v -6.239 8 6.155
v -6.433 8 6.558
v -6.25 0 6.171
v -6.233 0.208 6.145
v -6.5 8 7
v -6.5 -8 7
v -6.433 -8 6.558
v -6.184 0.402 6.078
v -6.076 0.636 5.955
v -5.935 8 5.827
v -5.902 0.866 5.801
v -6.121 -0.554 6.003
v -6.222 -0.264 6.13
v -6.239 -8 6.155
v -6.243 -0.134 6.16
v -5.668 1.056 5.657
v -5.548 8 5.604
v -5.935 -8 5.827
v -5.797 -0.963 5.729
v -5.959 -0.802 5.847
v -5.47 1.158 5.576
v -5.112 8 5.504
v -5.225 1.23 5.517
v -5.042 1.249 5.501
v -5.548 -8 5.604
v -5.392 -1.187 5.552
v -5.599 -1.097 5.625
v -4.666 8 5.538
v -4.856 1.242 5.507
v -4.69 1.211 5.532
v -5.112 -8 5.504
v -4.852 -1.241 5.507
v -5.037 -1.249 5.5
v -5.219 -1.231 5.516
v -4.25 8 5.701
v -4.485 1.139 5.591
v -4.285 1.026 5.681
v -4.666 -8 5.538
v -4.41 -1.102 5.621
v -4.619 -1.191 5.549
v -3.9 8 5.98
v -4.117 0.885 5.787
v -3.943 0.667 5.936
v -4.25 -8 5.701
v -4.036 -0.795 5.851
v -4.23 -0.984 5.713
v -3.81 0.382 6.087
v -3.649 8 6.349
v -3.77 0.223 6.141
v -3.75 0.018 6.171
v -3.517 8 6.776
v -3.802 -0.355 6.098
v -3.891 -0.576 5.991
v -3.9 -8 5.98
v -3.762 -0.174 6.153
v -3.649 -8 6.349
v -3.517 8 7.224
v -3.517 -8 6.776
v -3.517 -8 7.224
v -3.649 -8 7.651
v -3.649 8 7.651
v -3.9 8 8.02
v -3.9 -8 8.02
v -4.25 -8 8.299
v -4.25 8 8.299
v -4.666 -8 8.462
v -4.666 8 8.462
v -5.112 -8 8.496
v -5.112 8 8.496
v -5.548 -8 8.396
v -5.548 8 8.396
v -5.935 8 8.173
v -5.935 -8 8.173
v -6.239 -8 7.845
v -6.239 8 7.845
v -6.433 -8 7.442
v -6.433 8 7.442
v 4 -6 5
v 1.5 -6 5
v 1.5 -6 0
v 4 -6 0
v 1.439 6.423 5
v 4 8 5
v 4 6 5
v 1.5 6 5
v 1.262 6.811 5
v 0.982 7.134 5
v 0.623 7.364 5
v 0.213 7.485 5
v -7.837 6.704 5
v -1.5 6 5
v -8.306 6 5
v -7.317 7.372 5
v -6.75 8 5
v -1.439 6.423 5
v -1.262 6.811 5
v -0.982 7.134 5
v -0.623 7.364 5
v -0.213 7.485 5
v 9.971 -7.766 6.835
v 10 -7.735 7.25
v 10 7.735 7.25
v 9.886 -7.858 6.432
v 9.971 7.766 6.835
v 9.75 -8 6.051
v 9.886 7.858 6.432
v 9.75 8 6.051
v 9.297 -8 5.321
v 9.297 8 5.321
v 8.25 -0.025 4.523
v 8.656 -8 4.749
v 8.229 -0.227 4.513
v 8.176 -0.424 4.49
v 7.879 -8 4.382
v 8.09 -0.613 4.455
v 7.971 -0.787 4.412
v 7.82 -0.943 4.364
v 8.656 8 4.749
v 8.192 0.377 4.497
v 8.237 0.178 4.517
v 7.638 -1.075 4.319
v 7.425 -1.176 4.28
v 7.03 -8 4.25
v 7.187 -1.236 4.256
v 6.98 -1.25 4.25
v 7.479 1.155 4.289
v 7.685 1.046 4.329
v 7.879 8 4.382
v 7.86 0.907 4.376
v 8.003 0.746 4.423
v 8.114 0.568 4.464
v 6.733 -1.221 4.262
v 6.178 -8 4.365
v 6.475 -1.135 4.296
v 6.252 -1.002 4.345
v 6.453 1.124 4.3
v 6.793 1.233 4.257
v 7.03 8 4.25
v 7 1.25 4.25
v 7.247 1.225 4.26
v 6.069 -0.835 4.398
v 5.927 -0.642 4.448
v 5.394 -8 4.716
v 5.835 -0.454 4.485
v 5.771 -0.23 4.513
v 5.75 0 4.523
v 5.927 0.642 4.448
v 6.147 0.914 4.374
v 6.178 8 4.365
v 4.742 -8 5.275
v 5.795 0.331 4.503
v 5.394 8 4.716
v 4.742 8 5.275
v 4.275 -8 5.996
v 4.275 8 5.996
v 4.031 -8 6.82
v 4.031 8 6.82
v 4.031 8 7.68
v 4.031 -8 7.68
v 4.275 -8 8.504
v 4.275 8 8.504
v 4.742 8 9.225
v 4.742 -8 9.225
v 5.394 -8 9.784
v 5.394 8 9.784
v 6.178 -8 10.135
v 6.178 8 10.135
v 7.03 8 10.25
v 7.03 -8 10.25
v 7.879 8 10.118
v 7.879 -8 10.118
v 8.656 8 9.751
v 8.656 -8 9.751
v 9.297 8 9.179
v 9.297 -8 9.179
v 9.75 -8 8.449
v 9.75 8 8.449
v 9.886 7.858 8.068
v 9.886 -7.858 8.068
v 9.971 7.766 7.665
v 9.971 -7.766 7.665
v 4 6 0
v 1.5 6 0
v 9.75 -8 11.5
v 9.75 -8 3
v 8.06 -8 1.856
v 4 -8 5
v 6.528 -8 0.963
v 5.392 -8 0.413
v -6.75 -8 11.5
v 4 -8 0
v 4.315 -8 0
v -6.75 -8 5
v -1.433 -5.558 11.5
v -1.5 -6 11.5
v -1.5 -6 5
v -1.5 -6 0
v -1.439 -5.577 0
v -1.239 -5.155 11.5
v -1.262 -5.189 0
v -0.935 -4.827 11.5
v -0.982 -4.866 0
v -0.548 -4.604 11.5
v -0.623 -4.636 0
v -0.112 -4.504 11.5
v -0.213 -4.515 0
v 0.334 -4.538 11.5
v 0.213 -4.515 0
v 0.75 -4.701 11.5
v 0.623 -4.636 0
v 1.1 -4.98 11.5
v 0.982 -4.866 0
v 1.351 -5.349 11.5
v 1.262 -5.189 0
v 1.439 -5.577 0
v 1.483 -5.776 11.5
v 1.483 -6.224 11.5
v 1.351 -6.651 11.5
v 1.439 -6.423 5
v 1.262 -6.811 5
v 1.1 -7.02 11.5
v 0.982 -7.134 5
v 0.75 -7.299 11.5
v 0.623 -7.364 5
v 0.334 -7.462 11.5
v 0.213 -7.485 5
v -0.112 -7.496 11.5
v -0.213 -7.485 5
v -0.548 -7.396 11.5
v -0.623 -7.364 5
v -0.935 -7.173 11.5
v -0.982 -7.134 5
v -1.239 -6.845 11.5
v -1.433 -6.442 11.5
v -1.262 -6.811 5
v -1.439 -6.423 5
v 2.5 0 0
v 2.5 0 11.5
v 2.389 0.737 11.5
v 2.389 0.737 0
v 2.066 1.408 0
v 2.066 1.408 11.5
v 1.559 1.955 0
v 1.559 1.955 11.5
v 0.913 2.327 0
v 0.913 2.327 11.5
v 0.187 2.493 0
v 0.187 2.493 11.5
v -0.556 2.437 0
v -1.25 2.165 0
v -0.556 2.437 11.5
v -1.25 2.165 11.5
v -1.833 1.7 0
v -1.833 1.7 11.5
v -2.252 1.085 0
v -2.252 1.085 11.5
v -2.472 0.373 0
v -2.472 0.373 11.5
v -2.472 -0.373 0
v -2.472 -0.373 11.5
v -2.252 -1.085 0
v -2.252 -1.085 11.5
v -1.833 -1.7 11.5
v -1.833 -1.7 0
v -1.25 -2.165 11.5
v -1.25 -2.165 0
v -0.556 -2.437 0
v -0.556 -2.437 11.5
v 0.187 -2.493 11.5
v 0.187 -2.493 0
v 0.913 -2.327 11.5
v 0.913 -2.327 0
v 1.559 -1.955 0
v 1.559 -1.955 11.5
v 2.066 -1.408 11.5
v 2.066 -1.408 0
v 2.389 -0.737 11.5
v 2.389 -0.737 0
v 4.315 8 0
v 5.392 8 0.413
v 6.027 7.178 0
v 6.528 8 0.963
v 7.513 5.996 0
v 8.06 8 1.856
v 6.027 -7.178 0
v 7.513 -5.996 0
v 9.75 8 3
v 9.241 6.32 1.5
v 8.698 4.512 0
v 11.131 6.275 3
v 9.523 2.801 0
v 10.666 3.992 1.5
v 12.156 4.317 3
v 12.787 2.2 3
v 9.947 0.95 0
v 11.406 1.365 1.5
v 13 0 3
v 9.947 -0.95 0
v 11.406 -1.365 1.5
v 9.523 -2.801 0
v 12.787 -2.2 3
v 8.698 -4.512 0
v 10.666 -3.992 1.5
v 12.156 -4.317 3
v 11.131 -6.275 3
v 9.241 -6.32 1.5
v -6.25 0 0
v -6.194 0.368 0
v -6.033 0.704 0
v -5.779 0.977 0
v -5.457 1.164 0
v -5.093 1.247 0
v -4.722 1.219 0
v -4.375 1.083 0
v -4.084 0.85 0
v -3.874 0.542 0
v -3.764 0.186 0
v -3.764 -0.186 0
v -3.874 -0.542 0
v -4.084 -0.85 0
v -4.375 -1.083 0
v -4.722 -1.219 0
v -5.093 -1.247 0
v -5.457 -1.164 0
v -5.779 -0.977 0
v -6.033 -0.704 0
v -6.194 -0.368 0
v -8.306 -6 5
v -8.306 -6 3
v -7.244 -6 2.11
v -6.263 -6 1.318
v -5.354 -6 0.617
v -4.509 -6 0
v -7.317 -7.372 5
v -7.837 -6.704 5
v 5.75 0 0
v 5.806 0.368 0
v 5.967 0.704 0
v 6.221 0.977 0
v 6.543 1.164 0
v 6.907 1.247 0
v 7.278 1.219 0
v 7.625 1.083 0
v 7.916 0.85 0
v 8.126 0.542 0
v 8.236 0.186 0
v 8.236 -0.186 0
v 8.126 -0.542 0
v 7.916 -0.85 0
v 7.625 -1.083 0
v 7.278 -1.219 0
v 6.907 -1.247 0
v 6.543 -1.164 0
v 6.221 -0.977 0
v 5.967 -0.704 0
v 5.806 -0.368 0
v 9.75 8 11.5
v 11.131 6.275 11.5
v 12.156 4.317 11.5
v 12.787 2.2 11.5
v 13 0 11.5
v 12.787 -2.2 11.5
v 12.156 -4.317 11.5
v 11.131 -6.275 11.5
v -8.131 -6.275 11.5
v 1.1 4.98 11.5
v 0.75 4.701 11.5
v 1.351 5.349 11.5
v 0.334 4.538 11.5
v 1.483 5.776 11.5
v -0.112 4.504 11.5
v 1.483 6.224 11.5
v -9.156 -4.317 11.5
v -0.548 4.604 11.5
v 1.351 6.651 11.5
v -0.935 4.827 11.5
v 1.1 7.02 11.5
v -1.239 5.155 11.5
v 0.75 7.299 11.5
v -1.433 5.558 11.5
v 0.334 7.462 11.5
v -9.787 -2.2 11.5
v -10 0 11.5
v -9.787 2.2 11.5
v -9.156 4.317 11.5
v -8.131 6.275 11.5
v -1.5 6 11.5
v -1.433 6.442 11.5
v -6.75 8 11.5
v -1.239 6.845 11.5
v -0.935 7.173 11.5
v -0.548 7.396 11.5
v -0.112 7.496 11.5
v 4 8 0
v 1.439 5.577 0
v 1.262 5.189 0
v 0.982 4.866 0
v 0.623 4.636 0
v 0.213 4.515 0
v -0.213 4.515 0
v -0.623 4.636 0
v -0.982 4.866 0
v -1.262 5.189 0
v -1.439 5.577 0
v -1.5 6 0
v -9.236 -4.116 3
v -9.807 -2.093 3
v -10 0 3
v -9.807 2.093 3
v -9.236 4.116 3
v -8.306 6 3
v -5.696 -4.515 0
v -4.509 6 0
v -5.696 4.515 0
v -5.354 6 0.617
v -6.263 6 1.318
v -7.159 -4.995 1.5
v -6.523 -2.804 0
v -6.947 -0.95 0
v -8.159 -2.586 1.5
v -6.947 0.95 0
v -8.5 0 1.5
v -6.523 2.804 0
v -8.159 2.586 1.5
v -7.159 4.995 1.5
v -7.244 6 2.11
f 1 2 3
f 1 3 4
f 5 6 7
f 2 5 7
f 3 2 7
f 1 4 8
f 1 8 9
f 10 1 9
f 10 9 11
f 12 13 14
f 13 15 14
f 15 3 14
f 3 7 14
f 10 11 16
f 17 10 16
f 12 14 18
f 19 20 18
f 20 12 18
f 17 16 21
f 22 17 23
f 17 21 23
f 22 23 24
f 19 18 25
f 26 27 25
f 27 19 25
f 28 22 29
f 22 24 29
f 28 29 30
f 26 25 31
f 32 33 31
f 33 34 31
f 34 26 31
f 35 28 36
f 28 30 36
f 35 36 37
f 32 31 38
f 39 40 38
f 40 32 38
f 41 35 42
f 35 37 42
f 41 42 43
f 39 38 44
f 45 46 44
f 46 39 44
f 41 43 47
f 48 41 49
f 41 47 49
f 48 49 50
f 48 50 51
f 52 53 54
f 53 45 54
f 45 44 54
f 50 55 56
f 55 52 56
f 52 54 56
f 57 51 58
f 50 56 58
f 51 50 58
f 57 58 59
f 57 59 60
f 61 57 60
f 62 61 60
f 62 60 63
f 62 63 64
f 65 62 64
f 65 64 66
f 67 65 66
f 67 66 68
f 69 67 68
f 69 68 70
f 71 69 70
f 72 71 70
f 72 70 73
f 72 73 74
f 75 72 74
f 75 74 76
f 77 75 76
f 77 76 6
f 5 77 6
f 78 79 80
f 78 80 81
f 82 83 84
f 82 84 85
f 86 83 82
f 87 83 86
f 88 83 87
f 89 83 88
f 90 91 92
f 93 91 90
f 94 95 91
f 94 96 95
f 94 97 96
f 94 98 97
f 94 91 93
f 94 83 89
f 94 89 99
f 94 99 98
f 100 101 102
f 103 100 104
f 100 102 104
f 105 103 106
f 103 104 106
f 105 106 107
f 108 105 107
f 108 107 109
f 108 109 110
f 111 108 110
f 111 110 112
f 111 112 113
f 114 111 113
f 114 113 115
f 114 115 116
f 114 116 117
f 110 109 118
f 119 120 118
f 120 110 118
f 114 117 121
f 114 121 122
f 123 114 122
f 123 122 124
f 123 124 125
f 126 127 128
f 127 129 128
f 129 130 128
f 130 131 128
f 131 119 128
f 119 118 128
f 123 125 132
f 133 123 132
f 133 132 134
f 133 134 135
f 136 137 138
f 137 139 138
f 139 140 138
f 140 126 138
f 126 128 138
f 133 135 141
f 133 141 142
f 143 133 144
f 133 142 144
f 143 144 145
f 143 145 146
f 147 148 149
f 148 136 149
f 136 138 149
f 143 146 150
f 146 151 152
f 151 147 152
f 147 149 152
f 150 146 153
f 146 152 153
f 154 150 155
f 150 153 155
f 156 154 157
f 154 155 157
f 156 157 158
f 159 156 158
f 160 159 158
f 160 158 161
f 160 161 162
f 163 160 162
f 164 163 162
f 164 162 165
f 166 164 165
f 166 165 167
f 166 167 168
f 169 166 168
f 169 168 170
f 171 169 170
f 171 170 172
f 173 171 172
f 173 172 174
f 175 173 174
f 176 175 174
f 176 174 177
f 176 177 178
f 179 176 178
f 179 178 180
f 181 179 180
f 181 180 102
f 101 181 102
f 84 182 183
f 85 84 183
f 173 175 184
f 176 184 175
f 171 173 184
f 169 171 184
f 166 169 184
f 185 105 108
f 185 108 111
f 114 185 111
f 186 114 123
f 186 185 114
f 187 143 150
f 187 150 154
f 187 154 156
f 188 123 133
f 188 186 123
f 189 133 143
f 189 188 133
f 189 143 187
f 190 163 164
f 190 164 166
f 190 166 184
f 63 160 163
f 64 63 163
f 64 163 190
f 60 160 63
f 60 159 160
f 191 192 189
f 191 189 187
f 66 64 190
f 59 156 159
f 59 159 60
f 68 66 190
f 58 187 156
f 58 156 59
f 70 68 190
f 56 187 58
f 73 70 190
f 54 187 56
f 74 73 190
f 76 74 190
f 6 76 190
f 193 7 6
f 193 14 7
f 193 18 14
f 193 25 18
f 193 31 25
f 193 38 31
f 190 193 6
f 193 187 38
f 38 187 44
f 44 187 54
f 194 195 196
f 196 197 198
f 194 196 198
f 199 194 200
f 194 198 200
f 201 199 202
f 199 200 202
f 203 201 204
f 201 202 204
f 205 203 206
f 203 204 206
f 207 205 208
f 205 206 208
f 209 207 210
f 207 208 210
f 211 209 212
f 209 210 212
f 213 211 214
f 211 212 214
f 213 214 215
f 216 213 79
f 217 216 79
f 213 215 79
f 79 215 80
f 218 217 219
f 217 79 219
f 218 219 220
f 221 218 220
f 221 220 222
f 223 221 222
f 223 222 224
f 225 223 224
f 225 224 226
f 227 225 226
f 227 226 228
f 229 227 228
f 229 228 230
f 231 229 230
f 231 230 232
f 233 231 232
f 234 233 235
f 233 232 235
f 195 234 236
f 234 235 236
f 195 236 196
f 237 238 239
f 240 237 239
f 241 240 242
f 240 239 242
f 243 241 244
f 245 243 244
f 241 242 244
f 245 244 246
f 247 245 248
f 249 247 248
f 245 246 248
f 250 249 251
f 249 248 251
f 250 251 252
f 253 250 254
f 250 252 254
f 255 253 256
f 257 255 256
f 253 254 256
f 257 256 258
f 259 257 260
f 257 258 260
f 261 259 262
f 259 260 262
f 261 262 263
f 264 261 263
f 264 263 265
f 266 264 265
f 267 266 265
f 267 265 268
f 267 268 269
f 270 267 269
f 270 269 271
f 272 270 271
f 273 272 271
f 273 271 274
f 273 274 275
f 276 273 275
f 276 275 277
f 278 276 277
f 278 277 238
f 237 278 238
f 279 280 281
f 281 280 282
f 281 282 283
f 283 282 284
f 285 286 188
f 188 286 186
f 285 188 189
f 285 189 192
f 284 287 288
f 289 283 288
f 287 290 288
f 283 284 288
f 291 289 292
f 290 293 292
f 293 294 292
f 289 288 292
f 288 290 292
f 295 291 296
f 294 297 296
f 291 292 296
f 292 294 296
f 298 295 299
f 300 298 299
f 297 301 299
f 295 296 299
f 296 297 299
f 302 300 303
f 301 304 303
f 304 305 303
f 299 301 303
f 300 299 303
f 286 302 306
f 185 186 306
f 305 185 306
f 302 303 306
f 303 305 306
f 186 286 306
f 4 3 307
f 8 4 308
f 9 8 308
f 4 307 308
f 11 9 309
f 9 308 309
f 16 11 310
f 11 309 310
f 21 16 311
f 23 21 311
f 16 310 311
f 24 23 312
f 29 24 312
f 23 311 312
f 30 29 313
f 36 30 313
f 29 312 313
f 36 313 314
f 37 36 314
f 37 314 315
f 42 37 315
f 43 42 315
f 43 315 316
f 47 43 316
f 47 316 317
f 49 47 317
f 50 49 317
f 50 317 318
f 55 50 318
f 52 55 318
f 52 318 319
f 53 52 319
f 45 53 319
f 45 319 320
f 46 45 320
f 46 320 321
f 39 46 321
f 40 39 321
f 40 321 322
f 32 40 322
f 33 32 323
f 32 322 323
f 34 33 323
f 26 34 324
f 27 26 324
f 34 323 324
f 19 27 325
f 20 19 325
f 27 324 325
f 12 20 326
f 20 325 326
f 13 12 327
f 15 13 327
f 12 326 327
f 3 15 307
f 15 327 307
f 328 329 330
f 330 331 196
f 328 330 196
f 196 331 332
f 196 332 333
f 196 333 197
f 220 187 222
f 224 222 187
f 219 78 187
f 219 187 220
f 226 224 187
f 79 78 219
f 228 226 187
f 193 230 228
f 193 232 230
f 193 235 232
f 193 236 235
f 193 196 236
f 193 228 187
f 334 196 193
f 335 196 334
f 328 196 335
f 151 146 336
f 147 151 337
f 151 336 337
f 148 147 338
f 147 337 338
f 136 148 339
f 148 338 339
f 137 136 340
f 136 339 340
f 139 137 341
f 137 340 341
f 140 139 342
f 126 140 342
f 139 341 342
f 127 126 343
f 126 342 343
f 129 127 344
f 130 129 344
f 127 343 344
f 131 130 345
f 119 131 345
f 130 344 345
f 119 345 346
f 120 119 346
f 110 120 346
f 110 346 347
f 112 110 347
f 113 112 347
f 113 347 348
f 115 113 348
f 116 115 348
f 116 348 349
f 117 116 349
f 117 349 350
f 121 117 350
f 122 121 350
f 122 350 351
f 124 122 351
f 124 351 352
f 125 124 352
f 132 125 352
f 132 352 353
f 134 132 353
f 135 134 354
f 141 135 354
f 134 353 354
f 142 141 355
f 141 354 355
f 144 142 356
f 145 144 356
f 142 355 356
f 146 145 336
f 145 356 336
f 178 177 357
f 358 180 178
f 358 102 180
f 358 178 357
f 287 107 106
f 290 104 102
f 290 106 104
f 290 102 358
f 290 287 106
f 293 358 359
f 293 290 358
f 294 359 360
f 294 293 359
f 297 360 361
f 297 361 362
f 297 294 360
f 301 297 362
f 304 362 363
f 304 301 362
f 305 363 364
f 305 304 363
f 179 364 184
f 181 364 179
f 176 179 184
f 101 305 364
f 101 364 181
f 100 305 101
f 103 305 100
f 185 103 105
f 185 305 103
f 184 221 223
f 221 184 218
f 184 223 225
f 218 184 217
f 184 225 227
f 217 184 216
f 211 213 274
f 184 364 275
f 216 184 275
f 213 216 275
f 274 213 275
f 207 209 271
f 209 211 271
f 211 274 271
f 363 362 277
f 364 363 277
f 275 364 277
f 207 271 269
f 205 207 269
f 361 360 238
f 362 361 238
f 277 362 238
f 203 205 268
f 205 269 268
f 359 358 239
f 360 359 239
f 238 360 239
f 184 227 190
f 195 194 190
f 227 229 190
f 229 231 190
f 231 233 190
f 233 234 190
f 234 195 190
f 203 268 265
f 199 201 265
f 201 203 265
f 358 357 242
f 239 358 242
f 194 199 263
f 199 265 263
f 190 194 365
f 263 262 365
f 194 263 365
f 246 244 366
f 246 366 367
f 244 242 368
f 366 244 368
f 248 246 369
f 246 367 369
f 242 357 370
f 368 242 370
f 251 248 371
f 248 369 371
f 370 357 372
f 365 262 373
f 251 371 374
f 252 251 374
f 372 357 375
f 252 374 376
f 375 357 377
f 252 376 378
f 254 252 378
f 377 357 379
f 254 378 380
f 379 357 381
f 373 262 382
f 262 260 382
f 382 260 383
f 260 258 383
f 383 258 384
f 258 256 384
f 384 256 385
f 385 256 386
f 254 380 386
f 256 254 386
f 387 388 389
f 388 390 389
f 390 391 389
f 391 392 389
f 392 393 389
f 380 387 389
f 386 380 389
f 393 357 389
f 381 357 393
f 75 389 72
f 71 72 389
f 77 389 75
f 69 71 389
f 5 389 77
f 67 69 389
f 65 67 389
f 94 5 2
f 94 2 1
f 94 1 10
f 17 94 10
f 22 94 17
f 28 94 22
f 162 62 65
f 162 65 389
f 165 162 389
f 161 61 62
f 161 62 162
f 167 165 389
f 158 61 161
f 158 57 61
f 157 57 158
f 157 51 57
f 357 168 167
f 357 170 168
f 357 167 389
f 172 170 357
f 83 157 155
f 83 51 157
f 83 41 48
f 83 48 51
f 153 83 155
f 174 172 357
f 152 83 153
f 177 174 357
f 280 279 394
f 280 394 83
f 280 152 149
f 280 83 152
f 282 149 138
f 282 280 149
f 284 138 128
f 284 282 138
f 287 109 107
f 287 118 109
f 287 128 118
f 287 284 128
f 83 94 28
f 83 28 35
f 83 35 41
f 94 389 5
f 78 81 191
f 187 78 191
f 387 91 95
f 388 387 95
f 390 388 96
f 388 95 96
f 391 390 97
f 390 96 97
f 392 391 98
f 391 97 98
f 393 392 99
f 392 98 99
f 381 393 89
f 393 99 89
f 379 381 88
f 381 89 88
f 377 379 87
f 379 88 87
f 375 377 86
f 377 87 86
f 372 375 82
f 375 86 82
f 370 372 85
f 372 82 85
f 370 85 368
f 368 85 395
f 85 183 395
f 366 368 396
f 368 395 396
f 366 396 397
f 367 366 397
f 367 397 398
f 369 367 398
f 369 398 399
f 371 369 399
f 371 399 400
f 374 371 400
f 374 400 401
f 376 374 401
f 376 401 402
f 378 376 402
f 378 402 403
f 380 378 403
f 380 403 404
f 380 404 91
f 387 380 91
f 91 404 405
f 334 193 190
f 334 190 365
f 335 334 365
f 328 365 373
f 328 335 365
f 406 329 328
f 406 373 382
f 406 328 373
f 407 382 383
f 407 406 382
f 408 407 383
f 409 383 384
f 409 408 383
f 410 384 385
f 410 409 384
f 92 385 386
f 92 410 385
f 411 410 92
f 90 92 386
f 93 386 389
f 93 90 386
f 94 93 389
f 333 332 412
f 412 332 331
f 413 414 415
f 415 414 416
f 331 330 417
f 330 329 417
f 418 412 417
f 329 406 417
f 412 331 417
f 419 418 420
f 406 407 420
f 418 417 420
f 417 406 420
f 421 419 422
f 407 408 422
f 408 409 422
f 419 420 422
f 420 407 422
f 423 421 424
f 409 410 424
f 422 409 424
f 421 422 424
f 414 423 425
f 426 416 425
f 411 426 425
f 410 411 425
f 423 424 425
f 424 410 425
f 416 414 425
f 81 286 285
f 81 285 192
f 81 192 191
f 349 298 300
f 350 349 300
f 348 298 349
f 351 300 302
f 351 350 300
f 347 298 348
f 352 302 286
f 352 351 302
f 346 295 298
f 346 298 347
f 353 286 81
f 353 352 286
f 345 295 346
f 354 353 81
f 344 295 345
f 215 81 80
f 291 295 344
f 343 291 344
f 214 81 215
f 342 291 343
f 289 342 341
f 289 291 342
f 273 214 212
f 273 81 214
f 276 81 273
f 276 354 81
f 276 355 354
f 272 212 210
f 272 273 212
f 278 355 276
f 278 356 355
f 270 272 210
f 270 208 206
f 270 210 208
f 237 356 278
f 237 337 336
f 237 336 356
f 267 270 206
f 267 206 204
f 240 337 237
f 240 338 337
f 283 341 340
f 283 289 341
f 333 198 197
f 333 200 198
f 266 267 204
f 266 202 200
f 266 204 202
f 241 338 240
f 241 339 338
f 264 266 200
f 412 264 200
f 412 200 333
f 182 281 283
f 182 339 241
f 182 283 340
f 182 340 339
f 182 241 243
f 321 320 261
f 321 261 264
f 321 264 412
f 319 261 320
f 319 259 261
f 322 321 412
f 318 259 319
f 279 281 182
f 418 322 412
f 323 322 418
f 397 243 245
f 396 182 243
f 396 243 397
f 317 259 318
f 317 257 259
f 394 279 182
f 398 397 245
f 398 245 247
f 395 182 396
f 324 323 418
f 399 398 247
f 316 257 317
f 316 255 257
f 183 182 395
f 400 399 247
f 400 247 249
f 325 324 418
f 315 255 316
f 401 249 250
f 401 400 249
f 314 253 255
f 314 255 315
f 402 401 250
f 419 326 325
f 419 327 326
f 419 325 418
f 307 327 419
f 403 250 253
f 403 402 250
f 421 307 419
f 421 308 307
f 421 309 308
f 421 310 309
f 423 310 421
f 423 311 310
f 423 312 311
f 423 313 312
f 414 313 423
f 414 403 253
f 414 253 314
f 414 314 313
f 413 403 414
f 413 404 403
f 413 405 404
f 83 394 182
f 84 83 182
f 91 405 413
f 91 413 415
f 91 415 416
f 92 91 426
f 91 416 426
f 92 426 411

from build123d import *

# Parameters (mm, degrees)
EXTRUDE_1_DEPTH              = 11.5
CUT_EXTRUDE_1_DEPTH          = 5
CUT_EXTRUDE_2_DEPTH          = 5
HOLE_WIZARD_3_0_3_1_D        = 3
HOLE_WIZARD_3_0_3_2_D        = 3
HOLE_WIZARD_2_5_2_5_1_REACH  = 21.112
HOLE_WIZARD_2_5_2_5_1_BORE_R = 1.25
HOLE_WIZARD_5_0_5_1_D        = 5
HOLE_WIZARD_6_0_6_1_D        = 6
HOLE_WIZARD_2_5_2_5_2_REACH  = 21.112
HOLE_WIZARD_2_5_2_5_2_BORE_R = 1.25
CHAMFER_1_SIZE               = 3


with BuildPart() as part:
    # Эскиз1 → Бобышка-Вытянуть1 (new body)
    with BuildSketch(Plane(origin=(0, 0, 0), x_dir=(-1, 0, 0), z_dir=(0, 0, -1))):
        with BuildLine():
            Line((6.75, 8), (-9.75, 8))
            ThreePointArc((-9.75, 8), (-13, 0), (-9.75, -8))
            Line((-9.75, -8), (6.75, -8))
            ThreePointArc((6.75, -8), (10, 0), (6.75, 8))
        make_face()
    extrude(amount=-EXTRUDE_1_DEPTH)

    # Эскиз2 → Вырез-Вытянуть1 (cut)
    with BuildSketch(Plane(origin=(0, 0, 0), x_dir=(-1, 0, 0), z_dir=(0, 0, -1))):
        with BuildLine():
            Line((-4, 6), (8.305725542, 6))
            ThreePointArc((8.305725542, 6), (7.583253924, 7.043086716), (6.75, 8))
            Line((6.75, 8), (-4, 8))
            Line((-4, 8), (-4, 6))
        make_face()
    extrude(amount=-CUT_EXTRUDE_1_DEPTH, mode=Mode.SUBTRACT)

    # Эскиз3 → Вырез-Вытянуть2 (cut)
    with BuildSketch(Plane(origin=(0, 0, 0), x_dir=(-1, 0, 0), z_dir=(0, 0, -1))):
        with BuildLine():
            Line((8.305725542, -6), (-4, -6))
            Line((-4, -6), (-4, -8))
            Line((-4, -8), (6.75, -8))
            ThreePointArc((6.75, -8), (7.583253924, -7.043086716), (8.305725542, -6))
        make_face()
    extrude(amount=-CUT_EXTRUDE_2_DEPTH, mode=Mode.SUBTRACT)

    # Диаметр отверстия Ø3.0 (3)1 (through all)
    with Locations(Plane.XY.offset(11.5)):
        with Locations((0, -6), (0, 6)):
            Hole(HOLE_WIZARD_3_0_3_1_D / 2)

    # Диаметр отверстия Ø3.0 (3)2 (through all)
    with Locations(Plane(origin=(0, 8, 0), x_dir=(1, 0, 0), z_dir=(0, 1, 0))):
        with Locations((-5, -7)):
            Hole(HOLE_WIZARD_3_0_3_2_D / 2)

    # Диаметр отверстия Ø2.5 (2.5)1 bore → Диаметр отверстия Ø2.5 (2.5)1 (cut, up to next)
    with BuildSketch(Plane(origin=(0, 0, 0), x_dir=(-1, 0, 0), z_dir=(0, 0, -1)), mode=Mode.PRIVATE) as hole_wizard_2_5_2_5_1_sk1:
        with Locations((5, 0)):
            Circle(HOLE_WIZARD_2_5_2_5_1_BORE_R)
    hole_wizard_2_5_2_5_1_tool1 = extrude(hole_wizard_2_5_2_5_1_sk1.sketch, amount=-HOLE_WIZARD_2_5_2_5_1_REACH, mode=Mode.PRIVATE) & part.part
    add(hole_wizard_2_5_2_5_1_tool1.solids().sort_by_distance((-5, 0, 0))[0], mode=Mode.SUBTRACT)

    # Диаметр отверстия Ø5.0 (5)1 (through all)
    with Locations(Plane(origin=(0, 0, 0), x_dir=(-1, 0, 0), z_dir=(0, 0, -1))):
        with Locations((0, 0)):
            Hole(HOLE_WIZARD_5_0_5_1_D / 2)

    # Диаметр отверстия Ø6.0 (6)1 (through all)
    with Locations(Plane(origin=(0, -8, 0), x_dir=(-1, 0, 0), z_dir=(0, -1, 0))):
        with Locations((-7, -7.25)):
            Hole(HOLE_WIZARD_6_0_6_1_D / 2)

    # Диаметр отверстия Ø2.5 (2.5)2 bore → Диаметр отверстия Ø2.5 (2.5)2 (cut, up to next)
    with BuildSketch(Plane(origin=(0, 0, 0), x_dir=(-1, 0, 0), z_dir=(0, 0, -1)), mode=Mode.PRIVATE) as hole_wizard_2_5_2_5_2_sk1:
        with Locations((-7, 0)):
            Circle(HOLE_WIZARD_2_5_2_5_2_BORE_R)
    hole_wizard_2_5_2_5_2_tool1 = extrude(hole_wizard_2_5_2_5_2_sk1.sketch, amount=-HOLE_WIZARD_2_5_2_5_2_REACH, mode=Mode.PRIVATE) & part.part
    add(hole_wizard_2_5_2_5_2_tool1.solids().sort_by_distance((7, 0, 0))[0], mode=Mode.SUBTRACT)

    # Фаска1
    chamfer_1_edges = [part.edges().sort_by_distance(p)[0] for p in [
        (-10, 0, 0),
        (13, 0, 0),
    ]]
    chamfer(chamfer_1_edges, length=CHAMFER_1_SIZE)


solid = part.part
